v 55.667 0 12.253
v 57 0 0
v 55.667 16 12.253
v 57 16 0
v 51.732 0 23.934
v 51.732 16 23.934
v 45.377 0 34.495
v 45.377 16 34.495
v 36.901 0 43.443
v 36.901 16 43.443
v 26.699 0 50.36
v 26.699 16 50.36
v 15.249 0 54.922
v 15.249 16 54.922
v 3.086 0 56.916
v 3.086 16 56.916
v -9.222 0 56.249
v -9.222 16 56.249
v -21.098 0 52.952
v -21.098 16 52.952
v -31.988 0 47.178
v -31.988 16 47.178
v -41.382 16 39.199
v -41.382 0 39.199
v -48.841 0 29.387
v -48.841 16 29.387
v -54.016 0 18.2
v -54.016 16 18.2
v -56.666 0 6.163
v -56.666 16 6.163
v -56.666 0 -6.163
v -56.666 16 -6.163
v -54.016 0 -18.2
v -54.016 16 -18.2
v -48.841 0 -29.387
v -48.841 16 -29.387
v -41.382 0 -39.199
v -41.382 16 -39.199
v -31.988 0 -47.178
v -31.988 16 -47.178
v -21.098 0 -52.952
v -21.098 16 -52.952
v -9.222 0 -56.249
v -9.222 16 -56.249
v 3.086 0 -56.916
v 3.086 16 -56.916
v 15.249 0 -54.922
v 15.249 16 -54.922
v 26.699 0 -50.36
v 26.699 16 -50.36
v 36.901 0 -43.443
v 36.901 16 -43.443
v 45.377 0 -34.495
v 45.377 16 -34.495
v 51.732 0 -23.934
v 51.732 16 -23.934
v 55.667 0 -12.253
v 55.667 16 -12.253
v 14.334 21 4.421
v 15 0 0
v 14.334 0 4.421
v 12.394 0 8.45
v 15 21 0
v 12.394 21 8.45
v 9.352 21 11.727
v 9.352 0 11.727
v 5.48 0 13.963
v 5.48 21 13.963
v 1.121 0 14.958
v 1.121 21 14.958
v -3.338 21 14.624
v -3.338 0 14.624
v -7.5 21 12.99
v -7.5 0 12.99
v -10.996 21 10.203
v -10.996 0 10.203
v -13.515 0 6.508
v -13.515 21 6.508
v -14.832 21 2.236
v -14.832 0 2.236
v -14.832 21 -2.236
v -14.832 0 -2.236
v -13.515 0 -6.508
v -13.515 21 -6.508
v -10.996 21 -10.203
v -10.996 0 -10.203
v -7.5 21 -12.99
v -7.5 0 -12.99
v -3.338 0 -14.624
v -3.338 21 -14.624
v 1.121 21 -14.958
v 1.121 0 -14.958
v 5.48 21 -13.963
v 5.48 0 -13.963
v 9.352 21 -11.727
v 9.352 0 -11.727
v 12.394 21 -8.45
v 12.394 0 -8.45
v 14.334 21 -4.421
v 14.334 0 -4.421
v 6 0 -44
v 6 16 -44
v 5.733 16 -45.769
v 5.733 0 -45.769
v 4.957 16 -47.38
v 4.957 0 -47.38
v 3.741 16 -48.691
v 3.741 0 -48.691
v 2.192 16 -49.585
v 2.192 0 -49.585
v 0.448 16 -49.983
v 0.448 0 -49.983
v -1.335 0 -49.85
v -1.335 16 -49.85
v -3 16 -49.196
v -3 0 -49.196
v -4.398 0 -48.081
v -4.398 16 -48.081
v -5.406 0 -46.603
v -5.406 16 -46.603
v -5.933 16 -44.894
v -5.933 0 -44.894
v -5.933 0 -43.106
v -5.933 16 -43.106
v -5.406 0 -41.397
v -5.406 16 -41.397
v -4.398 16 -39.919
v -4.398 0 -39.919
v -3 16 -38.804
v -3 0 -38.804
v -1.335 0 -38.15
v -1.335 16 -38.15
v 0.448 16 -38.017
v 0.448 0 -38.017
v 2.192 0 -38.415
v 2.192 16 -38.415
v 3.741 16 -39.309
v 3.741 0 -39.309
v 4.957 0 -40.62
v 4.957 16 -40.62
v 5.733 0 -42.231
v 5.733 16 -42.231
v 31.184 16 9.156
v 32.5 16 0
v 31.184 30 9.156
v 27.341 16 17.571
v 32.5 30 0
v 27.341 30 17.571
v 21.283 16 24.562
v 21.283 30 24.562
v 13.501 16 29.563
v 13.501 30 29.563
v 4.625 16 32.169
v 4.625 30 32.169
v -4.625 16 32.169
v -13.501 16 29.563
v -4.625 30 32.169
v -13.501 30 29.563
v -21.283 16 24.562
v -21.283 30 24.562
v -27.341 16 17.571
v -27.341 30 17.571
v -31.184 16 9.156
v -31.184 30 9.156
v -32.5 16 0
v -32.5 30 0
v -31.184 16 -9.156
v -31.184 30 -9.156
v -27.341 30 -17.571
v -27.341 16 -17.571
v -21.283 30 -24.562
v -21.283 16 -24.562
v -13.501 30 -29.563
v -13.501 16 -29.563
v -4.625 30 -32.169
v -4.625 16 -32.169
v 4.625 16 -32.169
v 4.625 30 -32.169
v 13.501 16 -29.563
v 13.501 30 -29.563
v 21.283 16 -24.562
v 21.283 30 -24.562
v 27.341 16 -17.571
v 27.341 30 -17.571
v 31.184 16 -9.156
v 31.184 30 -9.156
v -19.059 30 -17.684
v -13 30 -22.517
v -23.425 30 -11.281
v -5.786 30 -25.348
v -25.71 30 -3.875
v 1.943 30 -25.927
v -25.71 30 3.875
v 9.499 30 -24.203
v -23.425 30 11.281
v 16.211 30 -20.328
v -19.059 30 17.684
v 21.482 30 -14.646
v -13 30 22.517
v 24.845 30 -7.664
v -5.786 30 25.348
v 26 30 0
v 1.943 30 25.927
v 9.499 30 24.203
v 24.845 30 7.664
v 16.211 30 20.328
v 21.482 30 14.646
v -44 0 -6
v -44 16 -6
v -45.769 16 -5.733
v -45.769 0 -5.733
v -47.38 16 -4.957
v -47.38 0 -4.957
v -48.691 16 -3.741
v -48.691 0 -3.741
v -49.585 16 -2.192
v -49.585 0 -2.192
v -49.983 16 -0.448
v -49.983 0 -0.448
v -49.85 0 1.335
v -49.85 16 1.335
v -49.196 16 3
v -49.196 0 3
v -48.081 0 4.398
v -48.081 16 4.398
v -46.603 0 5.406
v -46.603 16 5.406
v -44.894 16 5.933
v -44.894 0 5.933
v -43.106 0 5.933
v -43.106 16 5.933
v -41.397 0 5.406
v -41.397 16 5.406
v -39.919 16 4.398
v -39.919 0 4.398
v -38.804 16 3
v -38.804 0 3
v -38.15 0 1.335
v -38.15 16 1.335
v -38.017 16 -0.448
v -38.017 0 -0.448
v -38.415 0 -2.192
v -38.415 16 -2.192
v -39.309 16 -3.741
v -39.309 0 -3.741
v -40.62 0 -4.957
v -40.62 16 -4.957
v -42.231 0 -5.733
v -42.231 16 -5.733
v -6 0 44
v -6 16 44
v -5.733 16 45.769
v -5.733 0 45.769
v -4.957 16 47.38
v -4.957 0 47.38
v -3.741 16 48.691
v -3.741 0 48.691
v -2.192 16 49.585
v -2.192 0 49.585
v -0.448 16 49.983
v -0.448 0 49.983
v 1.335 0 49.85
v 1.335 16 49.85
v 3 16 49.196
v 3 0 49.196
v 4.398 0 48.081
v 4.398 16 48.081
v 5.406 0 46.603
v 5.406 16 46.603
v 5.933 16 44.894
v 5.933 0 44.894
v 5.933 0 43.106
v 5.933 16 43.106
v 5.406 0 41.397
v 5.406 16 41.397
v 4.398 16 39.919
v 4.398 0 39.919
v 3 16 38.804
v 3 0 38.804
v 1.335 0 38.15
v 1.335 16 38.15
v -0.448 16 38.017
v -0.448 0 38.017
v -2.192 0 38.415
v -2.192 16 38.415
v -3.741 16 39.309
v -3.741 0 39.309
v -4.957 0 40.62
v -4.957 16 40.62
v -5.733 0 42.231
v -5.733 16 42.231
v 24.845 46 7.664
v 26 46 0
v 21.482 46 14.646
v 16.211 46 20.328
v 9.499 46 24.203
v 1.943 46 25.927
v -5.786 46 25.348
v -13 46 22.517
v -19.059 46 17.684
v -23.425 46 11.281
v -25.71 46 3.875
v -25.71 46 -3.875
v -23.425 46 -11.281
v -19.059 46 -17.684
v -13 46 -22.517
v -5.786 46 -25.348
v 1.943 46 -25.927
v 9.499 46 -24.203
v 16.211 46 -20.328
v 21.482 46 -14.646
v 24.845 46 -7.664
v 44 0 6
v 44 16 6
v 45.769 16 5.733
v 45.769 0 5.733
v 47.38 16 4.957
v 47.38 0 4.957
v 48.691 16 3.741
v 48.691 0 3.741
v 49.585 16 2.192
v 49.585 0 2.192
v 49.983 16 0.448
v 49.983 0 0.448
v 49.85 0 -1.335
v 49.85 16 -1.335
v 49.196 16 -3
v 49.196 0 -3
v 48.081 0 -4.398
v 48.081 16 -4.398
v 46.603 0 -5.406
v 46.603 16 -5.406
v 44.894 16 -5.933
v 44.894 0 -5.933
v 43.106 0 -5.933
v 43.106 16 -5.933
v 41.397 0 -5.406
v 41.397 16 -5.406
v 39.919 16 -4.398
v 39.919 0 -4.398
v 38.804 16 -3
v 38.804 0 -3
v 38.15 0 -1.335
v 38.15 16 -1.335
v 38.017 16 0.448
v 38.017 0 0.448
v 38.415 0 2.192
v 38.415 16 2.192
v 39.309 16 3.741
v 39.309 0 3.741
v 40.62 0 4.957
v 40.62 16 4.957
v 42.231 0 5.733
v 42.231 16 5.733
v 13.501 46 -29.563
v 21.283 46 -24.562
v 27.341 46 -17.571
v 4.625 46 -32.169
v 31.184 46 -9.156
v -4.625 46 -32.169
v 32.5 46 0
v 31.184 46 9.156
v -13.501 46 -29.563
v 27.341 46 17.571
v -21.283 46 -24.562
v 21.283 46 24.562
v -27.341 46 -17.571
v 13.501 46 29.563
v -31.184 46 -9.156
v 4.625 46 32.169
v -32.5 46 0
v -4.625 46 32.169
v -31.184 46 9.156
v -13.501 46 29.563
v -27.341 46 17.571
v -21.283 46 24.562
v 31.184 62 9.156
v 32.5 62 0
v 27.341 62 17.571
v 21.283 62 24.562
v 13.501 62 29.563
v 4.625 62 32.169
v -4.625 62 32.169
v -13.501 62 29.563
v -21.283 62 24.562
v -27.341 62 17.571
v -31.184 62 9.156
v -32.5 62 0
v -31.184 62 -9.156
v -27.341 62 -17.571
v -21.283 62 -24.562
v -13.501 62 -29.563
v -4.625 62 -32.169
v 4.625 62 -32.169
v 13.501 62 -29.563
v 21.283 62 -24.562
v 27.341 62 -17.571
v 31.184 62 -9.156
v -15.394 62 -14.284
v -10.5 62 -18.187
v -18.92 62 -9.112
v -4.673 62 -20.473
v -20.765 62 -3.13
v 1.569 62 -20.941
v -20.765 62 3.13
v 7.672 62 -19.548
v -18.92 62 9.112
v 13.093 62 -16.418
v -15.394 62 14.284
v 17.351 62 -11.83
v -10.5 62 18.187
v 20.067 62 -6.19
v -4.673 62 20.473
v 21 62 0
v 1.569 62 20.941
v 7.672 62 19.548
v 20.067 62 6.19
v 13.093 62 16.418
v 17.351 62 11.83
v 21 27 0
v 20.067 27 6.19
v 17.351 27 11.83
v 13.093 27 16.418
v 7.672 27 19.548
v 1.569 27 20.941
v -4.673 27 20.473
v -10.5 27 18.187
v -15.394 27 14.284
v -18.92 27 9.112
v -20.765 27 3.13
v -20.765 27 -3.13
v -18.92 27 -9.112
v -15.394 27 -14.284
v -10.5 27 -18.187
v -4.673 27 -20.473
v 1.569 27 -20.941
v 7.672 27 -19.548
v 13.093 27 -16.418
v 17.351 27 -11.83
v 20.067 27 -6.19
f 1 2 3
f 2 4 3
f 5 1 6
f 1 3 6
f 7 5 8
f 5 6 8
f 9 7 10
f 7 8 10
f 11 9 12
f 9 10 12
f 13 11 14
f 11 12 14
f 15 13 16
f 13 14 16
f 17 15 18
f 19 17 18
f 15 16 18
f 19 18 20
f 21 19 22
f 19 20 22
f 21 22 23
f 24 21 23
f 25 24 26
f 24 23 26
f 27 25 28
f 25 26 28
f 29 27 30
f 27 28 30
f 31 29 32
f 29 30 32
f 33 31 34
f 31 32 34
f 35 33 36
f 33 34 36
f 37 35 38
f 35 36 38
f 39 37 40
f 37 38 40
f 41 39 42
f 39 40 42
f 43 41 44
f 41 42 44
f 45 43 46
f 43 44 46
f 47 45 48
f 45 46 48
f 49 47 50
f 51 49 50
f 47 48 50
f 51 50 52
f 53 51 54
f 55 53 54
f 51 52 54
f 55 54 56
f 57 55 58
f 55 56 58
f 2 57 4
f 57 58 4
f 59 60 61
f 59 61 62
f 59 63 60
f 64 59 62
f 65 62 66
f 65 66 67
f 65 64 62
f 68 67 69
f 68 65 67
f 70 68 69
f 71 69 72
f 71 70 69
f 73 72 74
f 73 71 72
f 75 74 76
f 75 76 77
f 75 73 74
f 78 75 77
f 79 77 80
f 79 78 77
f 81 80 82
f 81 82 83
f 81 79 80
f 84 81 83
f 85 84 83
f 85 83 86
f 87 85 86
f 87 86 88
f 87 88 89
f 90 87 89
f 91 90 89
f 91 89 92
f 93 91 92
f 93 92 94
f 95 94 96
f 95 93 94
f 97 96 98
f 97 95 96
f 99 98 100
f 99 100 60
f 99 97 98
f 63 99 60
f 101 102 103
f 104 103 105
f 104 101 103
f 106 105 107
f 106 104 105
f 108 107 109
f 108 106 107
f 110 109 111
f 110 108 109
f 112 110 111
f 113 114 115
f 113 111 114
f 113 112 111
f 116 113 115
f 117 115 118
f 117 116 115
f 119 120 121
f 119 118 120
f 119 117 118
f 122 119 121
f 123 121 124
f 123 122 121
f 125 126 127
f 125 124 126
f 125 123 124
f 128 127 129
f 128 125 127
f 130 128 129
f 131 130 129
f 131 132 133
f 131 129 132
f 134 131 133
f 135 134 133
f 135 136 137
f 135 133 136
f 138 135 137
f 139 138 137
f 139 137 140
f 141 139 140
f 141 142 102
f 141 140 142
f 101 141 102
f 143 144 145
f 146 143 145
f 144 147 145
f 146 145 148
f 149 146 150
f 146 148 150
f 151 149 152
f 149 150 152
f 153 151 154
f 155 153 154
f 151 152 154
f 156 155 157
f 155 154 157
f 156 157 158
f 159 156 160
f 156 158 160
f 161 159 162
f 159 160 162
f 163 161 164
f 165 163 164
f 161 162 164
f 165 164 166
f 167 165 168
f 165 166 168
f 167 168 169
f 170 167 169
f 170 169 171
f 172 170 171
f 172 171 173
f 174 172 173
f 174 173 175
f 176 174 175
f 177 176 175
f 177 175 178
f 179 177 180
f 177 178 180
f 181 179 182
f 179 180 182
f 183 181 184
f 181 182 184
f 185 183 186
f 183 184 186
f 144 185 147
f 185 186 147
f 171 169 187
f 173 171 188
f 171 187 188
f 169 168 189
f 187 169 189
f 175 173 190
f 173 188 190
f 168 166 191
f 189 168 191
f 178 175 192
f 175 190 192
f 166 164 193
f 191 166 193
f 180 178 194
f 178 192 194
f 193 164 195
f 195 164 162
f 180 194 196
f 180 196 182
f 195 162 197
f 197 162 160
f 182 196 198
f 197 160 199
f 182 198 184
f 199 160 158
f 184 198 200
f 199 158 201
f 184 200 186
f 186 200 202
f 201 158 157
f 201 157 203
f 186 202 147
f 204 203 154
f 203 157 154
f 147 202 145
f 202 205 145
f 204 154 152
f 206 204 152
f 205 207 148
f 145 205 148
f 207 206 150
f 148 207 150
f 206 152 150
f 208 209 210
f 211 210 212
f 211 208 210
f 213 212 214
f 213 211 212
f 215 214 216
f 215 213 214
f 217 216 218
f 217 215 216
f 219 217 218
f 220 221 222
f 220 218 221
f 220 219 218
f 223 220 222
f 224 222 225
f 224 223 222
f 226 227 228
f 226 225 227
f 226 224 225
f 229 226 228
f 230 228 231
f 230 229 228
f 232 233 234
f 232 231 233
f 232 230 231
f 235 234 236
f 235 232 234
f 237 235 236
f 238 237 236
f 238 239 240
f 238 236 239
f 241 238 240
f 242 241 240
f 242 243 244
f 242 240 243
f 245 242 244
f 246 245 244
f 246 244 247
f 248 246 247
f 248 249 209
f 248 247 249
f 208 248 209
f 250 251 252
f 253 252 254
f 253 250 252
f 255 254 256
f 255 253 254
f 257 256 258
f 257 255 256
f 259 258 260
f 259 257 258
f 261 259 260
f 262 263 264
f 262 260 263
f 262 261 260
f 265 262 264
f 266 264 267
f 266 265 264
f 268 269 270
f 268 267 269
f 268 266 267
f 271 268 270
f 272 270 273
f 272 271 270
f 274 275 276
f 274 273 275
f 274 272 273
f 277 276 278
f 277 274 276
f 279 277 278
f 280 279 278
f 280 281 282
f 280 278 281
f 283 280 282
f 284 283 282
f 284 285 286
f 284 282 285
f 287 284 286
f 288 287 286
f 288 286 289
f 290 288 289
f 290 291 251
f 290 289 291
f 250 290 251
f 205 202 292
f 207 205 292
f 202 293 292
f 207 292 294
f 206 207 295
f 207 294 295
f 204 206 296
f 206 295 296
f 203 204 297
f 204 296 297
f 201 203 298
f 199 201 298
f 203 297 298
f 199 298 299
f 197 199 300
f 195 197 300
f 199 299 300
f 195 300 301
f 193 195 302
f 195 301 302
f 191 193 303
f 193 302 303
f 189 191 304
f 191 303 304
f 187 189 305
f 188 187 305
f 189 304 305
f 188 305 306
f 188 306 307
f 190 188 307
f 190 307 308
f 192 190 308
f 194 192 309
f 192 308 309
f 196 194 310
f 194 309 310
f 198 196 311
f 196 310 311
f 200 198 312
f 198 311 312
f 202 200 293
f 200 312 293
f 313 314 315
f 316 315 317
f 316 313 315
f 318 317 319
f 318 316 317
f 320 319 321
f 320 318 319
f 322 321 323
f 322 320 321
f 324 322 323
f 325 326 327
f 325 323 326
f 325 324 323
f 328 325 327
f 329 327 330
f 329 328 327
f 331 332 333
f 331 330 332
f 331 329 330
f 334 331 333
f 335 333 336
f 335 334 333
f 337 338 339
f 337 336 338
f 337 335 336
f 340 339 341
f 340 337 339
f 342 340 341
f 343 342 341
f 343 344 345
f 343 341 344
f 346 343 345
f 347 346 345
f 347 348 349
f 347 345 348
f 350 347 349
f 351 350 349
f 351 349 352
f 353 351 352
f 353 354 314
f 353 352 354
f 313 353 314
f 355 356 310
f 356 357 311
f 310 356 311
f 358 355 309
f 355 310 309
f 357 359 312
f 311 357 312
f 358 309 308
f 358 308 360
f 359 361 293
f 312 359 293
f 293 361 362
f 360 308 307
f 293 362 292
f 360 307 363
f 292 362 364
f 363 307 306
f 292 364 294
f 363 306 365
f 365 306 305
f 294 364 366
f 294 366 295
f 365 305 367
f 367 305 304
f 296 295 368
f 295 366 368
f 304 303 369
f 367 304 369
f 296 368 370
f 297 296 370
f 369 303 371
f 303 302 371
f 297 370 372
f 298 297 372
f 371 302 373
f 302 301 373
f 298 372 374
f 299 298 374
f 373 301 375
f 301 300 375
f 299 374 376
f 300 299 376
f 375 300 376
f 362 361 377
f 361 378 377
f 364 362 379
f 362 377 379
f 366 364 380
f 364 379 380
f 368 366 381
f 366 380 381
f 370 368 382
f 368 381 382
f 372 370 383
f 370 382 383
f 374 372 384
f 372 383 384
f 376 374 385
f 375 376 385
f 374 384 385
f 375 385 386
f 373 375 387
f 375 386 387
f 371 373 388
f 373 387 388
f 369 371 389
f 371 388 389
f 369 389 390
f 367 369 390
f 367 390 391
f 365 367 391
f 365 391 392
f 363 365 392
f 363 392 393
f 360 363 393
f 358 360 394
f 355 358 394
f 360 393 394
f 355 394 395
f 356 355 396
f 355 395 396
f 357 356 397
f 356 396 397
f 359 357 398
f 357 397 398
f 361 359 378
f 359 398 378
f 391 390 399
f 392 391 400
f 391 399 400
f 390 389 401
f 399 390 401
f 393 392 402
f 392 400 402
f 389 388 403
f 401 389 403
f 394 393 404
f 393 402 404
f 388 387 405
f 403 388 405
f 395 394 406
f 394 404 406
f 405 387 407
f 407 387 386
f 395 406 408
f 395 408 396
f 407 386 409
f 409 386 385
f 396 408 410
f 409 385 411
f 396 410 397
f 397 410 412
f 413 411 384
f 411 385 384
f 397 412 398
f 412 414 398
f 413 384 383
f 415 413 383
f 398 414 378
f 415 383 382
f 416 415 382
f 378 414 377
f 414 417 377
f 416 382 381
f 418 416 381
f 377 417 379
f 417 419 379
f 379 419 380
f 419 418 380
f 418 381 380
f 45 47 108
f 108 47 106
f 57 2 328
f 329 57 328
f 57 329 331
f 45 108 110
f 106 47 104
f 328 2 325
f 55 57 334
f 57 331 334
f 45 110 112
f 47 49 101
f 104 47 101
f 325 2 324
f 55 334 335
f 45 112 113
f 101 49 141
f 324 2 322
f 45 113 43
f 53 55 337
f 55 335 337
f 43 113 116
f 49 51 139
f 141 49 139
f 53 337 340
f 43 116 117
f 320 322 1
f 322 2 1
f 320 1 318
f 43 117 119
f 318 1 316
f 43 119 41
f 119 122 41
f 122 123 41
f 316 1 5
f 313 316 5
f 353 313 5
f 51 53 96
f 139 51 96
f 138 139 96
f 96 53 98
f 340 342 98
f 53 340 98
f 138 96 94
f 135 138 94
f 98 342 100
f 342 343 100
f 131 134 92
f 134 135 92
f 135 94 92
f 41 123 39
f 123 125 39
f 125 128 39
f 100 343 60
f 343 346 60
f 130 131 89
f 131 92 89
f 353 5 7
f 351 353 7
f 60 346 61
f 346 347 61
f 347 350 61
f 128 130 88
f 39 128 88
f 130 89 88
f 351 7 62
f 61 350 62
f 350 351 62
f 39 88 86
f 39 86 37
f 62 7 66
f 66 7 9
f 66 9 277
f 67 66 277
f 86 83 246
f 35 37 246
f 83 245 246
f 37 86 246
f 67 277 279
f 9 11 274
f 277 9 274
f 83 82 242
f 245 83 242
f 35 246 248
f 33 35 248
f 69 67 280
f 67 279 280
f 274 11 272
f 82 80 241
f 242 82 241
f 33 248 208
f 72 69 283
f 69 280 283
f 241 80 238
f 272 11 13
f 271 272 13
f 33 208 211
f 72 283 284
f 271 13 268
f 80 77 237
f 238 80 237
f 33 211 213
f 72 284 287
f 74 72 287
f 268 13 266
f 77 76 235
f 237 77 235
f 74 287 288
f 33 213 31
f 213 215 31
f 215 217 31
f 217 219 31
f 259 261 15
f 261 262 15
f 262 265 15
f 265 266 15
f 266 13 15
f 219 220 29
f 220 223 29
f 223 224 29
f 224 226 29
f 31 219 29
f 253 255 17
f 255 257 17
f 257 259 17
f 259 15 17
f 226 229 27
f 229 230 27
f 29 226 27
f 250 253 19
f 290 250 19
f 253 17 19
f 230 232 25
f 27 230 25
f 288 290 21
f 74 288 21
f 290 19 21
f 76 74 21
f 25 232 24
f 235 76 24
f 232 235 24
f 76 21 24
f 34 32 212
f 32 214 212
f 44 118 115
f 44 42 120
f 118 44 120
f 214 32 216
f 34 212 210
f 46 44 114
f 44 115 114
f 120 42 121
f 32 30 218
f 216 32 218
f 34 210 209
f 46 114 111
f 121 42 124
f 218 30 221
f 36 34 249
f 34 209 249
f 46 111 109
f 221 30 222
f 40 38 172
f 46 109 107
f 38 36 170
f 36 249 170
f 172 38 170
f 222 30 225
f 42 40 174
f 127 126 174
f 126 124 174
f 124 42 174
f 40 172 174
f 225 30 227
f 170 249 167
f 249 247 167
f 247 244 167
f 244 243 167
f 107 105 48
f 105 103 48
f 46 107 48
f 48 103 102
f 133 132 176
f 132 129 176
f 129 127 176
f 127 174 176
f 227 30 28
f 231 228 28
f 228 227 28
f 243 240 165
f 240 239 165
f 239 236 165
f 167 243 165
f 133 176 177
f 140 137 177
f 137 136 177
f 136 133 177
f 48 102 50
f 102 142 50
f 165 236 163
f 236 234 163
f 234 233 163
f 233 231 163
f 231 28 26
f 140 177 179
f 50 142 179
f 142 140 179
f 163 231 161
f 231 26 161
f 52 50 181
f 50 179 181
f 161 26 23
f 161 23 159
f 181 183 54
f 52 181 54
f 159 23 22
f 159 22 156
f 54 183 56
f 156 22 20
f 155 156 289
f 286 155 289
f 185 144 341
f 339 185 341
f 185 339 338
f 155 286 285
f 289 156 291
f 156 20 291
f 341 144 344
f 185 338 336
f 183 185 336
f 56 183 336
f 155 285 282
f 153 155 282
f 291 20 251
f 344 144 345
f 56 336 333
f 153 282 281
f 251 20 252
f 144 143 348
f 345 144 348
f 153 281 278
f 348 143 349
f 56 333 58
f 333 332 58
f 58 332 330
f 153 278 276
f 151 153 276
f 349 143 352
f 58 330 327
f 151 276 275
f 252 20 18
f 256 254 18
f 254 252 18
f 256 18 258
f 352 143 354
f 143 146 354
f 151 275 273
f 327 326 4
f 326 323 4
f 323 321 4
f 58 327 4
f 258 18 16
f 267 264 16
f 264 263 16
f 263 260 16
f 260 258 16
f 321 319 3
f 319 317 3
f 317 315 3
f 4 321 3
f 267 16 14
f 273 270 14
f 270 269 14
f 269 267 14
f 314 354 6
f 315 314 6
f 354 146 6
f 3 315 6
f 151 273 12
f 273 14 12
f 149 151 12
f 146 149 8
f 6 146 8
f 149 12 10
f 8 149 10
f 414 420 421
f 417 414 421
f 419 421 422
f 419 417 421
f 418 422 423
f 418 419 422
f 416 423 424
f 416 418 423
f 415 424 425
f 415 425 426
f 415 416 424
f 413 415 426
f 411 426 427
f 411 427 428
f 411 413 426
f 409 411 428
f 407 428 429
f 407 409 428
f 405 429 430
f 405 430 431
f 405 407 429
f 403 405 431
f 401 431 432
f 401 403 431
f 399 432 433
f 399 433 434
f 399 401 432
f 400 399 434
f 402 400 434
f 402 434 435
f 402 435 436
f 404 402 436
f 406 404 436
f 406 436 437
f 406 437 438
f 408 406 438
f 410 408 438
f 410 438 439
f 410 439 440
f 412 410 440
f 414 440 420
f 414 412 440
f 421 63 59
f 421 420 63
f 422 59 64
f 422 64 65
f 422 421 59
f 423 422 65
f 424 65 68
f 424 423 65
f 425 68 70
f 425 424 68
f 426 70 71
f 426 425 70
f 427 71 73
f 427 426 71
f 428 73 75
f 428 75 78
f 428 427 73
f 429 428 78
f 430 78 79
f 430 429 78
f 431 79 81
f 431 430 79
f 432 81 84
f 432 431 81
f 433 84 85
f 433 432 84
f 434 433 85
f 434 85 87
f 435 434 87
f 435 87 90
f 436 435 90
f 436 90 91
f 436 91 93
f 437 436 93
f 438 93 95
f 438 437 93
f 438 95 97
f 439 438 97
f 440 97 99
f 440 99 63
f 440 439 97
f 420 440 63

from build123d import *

# Parameters (mm, degrees)
SKETCH_6_R               = 6
CUT_EXTRUDE_2_DEPTH      = 63
PATTERN_CIRCULAR_1_COUNT = 4


with BuildPart() as part:
    # 스케치2 → 회전1 (revolve)
    with BuildSketch(Plane.XY):
        Polygon((0, 0), (57, 0), (57, 16), (32.5, 16), (32.5, 30), (26, 30), (26, 46), (32.5, 46), (32.5, 62), (0, 62), align=None)
    revolve(axis=Axis((0, 81.32, 0), (0, -1, 0)))

    # 스케치5 → 컷-회전1 (revolve, cut)
    with BuildSketch(Plane.XY):
        Polygon((0, 0), (15, 0), (15, 21), (21, 27), (21, 62), (0, 62), align=None)
    revolve(axis=Axis((0, 62, 0), (0, -1, 0)), mode=Mode.SUBTRACT)

    # 스케치6 → 컷-돌출2 (cut, through all)
    with BuildSketch(Plane(origin=(0, 0, 0), x_dir=(1, 0, 0), z_dir=(0, 1, 0))):
        with Locations((0, 44)):
            Circle(SKETCH_6_R)
    cut_extrude_2 = extrude(amount=CUT_EXTRUDE_2_DEPTH, mode=Mode.SUBTRACT)

    # 원형 패턴1: 컷-돌출2 ×4 about axis
    pattern_circular_1_axis = Axis((0, 0, 0), (0, 1, 0))
    for i in range(1, PATTERN_CIRCULAR_1_COUNT):
        add(cut_extrude_2.rotate(pattern_circular_1_axis, i * 360 / PATTERN_CIRCULAR_1_COUNT), mode=Mode.SUBTRACT)


solid = part.part
